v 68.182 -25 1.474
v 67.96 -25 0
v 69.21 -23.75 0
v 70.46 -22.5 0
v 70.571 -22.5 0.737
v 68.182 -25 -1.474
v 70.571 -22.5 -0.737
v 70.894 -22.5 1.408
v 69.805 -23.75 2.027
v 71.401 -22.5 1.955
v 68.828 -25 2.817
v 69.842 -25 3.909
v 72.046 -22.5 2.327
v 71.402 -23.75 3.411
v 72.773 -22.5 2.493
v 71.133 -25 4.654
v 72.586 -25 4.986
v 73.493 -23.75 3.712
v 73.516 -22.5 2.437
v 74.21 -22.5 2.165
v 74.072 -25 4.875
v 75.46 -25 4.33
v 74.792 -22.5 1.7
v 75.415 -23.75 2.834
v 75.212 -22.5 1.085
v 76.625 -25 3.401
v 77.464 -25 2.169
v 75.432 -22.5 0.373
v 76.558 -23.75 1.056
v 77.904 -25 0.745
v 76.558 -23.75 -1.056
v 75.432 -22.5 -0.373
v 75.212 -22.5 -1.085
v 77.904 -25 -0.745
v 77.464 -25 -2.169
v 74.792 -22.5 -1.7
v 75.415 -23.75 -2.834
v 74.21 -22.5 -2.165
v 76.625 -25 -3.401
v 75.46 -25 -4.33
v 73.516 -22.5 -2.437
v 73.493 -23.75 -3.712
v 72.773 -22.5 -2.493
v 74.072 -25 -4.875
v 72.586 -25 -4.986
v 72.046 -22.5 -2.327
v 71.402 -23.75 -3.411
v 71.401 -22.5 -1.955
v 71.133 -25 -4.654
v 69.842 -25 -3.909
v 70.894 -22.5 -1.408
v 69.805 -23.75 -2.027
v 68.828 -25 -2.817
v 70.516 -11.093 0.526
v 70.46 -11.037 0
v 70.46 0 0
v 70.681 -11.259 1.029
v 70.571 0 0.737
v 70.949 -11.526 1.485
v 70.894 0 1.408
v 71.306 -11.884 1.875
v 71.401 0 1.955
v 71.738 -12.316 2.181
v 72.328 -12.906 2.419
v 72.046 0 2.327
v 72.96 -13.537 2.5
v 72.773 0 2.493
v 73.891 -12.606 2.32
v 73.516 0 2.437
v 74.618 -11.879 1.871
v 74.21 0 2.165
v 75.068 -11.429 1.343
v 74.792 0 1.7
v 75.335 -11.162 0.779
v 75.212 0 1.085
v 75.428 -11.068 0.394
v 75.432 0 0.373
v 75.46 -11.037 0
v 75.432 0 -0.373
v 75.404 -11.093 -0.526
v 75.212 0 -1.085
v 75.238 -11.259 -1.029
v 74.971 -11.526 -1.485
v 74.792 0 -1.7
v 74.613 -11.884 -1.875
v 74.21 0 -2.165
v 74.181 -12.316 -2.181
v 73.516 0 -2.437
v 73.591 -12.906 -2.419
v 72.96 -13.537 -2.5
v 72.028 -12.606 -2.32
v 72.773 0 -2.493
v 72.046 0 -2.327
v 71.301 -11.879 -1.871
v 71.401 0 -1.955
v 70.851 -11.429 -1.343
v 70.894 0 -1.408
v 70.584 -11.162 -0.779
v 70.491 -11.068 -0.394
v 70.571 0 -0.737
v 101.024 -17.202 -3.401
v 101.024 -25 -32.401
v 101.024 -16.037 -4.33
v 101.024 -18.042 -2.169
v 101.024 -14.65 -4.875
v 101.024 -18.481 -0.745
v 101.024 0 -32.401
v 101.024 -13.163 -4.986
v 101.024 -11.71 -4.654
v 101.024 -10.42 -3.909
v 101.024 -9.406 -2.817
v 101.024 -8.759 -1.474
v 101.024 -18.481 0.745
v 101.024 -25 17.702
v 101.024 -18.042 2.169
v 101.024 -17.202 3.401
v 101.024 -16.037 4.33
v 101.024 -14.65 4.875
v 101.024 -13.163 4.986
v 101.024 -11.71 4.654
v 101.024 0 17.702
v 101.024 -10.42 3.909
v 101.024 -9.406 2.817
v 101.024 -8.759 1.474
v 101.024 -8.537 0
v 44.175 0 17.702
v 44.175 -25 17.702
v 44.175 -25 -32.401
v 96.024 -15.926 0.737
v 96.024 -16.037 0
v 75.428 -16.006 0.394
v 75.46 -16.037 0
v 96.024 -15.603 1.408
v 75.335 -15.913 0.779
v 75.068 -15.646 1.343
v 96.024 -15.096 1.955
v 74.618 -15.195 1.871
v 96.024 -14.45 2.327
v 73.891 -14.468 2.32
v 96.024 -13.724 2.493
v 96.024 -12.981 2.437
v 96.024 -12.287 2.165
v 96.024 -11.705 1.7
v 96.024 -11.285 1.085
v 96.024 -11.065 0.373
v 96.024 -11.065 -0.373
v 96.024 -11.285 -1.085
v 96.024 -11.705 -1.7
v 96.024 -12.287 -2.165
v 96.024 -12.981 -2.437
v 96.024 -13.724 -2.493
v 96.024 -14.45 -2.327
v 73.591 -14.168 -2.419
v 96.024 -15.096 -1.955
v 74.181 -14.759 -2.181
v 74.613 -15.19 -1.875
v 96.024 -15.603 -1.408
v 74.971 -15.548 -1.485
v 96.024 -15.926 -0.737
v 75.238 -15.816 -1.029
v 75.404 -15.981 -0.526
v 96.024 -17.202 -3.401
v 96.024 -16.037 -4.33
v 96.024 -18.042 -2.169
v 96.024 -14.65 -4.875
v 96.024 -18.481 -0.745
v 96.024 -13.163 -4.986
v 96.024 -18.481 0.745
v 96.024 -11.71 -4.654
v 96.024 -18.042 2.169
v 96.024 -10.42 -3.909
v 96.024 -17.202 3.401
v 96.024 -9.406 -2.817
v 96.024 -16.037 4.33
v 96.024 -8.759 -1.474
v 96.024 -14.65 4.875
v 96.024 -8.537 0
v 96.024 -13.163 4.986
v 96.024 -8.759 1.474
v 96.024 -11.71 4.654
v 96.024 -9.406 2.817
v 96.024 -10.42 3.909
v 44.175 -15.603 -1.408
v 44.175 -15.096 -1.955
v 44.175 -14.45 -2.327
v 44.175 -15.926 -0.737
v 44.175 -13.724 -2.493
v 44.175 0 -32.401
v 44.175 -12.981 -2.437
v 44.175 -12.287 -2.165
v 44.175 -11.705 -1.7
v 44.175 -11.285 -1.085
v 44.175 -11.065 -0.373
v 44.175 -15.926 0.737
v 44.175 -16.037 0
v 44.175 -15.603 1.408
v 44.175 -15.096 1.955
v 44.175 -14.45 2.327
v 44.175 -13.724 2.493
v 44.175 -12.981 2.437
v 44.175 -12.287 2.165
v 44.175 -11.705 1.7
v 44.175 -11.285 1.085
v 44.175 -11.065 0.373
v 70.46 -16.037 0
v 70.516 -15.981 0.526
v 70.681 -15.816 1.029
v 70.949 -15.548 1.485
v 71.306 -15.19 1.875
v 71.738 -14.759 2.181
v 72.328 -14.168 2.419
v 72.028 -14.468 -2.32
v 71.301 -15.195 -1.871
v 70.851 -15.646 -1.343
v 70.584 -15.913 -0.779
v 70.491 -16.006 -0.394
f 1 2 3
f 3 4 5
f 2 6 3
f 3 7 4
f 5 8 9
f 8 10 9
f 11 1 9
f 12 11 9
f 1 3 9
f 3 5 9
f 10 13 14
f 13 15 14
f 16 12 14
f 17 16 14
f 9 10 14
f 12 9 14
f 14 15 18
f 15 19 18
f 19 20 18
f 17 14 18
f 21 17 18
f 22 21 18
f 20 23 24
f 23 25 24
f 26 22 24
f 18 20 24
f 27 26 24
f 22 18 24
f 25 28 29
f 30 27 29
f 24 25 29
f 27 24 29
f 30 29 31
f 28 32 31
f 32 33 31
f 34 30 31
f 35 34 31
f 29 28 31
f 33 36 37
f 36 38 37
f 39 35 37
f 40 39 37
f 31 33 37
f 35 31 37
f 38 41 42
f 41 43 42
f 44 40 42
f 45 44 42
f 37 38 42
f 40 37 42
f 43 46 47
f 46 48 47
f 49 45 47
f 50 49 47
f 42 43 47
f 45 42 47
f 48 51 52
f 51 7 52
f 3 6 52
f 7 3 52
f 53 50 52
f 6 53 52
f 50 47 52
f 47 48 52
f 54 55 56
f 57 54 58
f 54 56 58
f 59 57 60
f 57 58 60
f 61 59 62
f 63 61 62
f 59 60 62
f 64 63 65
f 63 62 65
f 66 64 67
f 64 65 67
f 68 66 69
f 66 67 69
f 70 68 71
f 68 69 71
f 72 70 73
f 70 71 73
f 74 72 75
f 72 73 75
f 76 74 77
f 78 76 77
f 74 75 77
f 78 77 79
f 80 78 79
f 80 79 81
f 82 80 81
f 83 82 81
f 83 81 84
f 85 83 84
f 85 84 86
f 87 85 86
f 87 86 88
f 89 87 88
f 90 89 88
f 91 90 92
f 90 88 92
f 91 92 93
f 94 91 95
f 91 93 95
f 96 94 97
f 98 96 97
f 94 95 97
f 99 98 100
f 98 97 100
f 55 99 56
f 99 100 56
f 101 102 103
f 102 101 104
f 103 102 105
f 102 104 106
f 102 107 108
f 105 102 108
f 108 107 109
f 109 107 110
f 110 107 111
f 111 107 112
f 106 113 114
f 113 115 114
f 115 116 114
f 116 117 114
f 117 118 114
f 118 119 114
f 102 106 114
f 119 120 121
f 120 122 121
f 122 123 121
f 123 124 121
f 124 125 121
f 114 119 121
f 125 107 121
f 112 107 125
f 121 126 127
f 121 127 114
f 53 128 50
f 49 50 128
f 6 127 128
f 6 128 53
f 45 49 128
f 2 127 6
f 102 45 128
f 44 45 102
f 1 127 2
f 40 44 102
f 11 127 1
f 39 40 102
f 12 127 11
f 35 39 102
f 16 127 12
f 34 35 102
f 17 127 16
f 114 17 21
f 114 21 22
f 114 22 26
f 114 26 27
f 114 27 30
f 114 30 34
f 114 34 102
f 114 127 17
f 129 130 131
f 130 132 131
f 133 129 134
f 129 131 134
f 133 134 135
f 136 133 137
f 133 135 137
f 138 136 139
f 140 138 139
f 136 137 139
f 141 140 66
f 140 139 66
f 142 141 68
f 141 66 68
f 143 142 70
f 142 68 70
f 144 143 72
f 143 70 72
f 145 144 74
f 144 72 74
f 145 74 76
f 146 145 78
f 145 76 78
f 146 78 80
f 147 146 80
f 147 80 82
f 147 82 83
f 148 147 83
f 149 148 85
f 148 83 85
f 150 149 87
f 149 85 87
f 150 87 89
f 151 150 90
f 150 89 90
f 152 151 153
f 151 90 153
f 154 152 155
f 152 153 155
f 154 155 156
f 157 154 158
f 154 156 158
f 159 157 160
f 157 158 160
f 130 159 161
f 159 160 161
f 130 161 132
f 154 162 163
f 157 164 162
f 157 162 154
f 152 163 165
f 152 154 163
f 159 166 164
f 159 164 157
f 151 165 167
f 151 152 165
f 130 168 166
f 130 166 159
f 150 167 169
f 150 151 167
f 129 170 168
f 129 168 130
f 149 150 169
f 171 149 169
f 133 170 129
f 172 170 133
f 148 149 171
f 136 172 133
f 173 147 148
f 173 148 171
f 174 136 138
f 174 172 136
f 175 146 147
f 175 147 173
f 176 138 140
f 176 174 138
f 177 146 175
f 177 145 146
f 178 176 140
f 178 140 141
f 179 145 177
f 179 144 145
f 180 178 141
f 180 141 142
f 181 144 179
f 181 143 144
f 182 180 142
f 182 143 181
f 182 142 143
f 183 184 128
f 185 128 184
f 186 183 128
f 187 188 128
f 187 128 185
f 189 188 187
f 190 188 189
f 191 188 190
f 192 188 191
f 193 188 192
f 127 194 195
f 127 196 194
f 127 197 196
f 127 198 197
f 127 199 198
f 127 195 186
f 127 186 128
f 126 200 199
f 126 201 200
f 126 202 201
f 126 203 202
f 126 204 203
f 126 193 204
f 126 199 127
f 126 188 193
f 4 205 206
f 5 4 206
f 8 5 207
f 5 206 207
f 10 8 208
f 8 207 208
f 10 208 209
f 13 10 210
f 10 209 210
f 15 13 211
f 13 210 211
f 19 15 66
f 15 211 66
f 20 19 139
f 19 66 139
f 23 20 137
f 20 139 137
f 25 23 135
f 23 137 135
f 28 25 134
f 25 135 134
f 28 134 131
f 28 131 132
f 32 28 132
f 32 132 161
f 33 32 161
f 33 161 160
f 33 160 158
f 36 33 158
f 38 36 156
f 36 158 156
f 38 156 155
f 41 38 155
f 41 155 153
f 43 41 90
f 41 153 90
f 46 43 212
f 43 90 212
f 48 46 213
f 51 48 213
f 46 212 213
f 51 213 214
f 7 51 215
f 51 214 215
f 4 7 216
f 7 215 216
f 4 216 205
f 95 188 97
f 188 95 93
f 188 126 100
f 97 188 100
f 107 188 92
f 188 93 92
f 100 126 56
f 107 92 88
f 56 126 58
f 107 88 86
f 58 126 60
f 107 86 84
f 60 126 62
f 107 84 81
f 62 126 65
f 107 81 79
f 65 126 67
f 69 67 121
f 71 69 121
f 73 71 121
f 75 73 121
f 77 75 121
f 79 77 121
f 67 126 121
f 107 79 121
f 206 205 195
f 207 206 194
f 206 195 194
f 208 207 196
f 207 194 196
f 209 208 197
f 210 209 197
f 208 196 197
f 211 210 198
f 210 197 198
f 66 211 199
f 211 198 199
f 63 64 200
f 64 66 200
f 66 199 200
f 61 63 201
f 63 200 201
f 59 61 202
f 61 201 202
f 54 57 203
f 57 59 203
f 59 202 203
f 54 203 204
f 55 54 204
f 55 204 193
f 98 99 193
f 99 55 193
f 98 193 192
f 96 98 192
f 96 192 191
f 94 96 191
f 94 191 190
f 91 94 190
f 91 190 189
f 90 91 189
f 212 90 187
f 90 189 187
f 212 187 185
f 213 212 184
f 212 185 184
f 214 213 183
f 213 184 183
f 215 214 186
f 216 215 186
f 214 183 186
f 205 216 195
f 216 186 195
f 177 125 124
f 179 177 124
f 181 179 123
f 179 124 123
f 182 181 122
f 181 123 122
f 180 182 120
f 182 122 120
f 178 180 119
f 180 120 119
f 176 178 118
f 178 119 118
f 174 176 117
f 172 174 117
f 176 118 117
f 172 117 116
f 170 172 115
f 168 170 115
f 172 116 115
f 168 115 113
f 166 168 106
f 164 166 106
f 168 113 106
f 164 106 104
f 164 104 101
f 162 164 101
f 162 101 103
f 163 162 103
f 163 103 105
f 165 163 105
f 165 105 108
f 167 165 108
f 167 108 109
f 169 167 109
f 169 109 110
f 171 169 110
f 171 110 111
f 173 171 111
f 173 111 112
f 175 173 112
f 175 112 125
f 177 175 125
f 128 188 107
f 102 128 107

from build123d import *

# Parameters (mm, degrees)
F0_W           = 56.849372
F0_H           = 50.102681
F1_DEPTH       = 25
F3_D           = 5
F3_CSINK_D     = 10
F3_CSINK_ANGLE = 90
F5_D           = 5
F5_CSINK_D     = 10
F5_CSINK_ANGLE = 90
F6_D           = 5
F6_CBORE_D     = 10
F6_CBORE_DEPTH = 5


with BuildPart() as f1:
    # F0 (on Front) → F1 (new body)
    with BuildSketch(Plane.XZ):
        with Locations((72.599741, -7.349261)):
            Rectangle(F0_W, F0_H)
    extrude(amount=F1_DEPTH)

    # F3 (through all)
    with Locations(Plane.XZ.offset(25)):
        with Locations((72.959617, 0)):
            CounterSinkHole(F3_D / 2, F3_CSINK_D / 2, counter_sink_angle=F3_CSINK_ANGLE)

    # F5 (through all)
    with Locations(Plane.YZ.offset(101.024427)):
        with Locations((-13.537139, 0)):
            CounterSinkHole(F5_D / 2, F5_CSINK_D / 2, counter_sink_angle=F5_CSINK_ANGLE)

    # F6 (through all)
    with Locations(Plane.YZ.offset(101.024427)):
        with Locations((-13.537139, 0)):
            CounterBoreHole(F6_D / 2, F6_CBORE_D / 2, F6_CBORE_DEPTH)


solid = f1.part
